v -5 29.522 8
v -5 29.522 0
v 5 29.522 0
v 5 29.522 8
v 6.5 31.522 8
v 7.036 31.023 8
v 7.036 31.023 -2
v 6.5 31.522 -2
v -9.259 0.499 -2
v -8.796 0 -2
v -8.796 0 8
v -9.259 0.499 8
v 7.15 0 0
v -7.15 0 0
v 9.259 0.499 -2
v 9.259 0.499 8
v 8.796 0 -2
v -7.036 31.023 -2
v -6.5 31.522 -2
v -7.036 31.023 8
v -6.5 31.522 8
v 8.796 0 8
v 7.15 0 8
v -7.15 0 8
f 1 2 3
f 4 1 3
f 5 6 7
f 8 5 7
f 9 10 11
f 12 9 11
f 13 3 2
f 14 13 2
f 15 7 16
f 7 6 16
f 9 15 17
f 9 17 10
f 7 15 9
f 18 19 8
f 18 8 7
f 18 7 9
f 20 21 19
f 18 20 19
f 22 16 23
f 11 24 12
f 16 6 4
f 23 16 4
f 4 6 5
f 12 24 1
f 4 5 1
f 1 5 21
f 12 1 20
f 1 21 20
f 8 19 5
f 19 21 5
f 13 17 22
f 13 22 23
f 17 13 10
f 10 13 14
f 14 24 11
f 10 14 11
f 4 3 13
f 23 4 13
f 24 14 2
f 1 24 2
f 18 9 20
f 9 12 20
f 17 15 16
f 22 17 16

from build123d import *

# Parameters (mm, degrees)
PAD_DEPTH      = 8
PAD_DEPTH_BACK = 2
POCKET_DEPTH   = 8.001
CHAMFER_SIZE   = 0.5


with BuildPart() as part:
    # Sketch001 → Pad (new body, two sides)
    with BuildSketch(Plane.XY) as pad_sk:
        Polygon((-9.295655, 0), (-7, 31.521814), (7, 31.521814), (9.295655, 0), align=None)
    extrude(amount=PAD_DEPTH)
    extrude(pad_sk.sketch, amount=-PAD_DEPTH_BACK)

    # Sketch → Pocket (cut, through all)
    with BuildSketch(Plane.XY):
        Polygon((-7.15, 0), (-5, 29.521814), (5, 29.521814), (7.15, 0), align=None)
    extrude(amount=POCKET_DEPTH, mode=Mode.SUBTRACT)

    # Chamfer
    chamfer_edges = [part.edges().sort_by_distance(p)[0] for p in [
        (7, 31.521814, 3),
        (-7, 31.521814, 3),
        (-9.295655, 0, 3),
        (9.295655, 0, 3),
    ]]
    chamfer(chamfer_edges, length=CHAMFER_SIZE)


solid = part.part
